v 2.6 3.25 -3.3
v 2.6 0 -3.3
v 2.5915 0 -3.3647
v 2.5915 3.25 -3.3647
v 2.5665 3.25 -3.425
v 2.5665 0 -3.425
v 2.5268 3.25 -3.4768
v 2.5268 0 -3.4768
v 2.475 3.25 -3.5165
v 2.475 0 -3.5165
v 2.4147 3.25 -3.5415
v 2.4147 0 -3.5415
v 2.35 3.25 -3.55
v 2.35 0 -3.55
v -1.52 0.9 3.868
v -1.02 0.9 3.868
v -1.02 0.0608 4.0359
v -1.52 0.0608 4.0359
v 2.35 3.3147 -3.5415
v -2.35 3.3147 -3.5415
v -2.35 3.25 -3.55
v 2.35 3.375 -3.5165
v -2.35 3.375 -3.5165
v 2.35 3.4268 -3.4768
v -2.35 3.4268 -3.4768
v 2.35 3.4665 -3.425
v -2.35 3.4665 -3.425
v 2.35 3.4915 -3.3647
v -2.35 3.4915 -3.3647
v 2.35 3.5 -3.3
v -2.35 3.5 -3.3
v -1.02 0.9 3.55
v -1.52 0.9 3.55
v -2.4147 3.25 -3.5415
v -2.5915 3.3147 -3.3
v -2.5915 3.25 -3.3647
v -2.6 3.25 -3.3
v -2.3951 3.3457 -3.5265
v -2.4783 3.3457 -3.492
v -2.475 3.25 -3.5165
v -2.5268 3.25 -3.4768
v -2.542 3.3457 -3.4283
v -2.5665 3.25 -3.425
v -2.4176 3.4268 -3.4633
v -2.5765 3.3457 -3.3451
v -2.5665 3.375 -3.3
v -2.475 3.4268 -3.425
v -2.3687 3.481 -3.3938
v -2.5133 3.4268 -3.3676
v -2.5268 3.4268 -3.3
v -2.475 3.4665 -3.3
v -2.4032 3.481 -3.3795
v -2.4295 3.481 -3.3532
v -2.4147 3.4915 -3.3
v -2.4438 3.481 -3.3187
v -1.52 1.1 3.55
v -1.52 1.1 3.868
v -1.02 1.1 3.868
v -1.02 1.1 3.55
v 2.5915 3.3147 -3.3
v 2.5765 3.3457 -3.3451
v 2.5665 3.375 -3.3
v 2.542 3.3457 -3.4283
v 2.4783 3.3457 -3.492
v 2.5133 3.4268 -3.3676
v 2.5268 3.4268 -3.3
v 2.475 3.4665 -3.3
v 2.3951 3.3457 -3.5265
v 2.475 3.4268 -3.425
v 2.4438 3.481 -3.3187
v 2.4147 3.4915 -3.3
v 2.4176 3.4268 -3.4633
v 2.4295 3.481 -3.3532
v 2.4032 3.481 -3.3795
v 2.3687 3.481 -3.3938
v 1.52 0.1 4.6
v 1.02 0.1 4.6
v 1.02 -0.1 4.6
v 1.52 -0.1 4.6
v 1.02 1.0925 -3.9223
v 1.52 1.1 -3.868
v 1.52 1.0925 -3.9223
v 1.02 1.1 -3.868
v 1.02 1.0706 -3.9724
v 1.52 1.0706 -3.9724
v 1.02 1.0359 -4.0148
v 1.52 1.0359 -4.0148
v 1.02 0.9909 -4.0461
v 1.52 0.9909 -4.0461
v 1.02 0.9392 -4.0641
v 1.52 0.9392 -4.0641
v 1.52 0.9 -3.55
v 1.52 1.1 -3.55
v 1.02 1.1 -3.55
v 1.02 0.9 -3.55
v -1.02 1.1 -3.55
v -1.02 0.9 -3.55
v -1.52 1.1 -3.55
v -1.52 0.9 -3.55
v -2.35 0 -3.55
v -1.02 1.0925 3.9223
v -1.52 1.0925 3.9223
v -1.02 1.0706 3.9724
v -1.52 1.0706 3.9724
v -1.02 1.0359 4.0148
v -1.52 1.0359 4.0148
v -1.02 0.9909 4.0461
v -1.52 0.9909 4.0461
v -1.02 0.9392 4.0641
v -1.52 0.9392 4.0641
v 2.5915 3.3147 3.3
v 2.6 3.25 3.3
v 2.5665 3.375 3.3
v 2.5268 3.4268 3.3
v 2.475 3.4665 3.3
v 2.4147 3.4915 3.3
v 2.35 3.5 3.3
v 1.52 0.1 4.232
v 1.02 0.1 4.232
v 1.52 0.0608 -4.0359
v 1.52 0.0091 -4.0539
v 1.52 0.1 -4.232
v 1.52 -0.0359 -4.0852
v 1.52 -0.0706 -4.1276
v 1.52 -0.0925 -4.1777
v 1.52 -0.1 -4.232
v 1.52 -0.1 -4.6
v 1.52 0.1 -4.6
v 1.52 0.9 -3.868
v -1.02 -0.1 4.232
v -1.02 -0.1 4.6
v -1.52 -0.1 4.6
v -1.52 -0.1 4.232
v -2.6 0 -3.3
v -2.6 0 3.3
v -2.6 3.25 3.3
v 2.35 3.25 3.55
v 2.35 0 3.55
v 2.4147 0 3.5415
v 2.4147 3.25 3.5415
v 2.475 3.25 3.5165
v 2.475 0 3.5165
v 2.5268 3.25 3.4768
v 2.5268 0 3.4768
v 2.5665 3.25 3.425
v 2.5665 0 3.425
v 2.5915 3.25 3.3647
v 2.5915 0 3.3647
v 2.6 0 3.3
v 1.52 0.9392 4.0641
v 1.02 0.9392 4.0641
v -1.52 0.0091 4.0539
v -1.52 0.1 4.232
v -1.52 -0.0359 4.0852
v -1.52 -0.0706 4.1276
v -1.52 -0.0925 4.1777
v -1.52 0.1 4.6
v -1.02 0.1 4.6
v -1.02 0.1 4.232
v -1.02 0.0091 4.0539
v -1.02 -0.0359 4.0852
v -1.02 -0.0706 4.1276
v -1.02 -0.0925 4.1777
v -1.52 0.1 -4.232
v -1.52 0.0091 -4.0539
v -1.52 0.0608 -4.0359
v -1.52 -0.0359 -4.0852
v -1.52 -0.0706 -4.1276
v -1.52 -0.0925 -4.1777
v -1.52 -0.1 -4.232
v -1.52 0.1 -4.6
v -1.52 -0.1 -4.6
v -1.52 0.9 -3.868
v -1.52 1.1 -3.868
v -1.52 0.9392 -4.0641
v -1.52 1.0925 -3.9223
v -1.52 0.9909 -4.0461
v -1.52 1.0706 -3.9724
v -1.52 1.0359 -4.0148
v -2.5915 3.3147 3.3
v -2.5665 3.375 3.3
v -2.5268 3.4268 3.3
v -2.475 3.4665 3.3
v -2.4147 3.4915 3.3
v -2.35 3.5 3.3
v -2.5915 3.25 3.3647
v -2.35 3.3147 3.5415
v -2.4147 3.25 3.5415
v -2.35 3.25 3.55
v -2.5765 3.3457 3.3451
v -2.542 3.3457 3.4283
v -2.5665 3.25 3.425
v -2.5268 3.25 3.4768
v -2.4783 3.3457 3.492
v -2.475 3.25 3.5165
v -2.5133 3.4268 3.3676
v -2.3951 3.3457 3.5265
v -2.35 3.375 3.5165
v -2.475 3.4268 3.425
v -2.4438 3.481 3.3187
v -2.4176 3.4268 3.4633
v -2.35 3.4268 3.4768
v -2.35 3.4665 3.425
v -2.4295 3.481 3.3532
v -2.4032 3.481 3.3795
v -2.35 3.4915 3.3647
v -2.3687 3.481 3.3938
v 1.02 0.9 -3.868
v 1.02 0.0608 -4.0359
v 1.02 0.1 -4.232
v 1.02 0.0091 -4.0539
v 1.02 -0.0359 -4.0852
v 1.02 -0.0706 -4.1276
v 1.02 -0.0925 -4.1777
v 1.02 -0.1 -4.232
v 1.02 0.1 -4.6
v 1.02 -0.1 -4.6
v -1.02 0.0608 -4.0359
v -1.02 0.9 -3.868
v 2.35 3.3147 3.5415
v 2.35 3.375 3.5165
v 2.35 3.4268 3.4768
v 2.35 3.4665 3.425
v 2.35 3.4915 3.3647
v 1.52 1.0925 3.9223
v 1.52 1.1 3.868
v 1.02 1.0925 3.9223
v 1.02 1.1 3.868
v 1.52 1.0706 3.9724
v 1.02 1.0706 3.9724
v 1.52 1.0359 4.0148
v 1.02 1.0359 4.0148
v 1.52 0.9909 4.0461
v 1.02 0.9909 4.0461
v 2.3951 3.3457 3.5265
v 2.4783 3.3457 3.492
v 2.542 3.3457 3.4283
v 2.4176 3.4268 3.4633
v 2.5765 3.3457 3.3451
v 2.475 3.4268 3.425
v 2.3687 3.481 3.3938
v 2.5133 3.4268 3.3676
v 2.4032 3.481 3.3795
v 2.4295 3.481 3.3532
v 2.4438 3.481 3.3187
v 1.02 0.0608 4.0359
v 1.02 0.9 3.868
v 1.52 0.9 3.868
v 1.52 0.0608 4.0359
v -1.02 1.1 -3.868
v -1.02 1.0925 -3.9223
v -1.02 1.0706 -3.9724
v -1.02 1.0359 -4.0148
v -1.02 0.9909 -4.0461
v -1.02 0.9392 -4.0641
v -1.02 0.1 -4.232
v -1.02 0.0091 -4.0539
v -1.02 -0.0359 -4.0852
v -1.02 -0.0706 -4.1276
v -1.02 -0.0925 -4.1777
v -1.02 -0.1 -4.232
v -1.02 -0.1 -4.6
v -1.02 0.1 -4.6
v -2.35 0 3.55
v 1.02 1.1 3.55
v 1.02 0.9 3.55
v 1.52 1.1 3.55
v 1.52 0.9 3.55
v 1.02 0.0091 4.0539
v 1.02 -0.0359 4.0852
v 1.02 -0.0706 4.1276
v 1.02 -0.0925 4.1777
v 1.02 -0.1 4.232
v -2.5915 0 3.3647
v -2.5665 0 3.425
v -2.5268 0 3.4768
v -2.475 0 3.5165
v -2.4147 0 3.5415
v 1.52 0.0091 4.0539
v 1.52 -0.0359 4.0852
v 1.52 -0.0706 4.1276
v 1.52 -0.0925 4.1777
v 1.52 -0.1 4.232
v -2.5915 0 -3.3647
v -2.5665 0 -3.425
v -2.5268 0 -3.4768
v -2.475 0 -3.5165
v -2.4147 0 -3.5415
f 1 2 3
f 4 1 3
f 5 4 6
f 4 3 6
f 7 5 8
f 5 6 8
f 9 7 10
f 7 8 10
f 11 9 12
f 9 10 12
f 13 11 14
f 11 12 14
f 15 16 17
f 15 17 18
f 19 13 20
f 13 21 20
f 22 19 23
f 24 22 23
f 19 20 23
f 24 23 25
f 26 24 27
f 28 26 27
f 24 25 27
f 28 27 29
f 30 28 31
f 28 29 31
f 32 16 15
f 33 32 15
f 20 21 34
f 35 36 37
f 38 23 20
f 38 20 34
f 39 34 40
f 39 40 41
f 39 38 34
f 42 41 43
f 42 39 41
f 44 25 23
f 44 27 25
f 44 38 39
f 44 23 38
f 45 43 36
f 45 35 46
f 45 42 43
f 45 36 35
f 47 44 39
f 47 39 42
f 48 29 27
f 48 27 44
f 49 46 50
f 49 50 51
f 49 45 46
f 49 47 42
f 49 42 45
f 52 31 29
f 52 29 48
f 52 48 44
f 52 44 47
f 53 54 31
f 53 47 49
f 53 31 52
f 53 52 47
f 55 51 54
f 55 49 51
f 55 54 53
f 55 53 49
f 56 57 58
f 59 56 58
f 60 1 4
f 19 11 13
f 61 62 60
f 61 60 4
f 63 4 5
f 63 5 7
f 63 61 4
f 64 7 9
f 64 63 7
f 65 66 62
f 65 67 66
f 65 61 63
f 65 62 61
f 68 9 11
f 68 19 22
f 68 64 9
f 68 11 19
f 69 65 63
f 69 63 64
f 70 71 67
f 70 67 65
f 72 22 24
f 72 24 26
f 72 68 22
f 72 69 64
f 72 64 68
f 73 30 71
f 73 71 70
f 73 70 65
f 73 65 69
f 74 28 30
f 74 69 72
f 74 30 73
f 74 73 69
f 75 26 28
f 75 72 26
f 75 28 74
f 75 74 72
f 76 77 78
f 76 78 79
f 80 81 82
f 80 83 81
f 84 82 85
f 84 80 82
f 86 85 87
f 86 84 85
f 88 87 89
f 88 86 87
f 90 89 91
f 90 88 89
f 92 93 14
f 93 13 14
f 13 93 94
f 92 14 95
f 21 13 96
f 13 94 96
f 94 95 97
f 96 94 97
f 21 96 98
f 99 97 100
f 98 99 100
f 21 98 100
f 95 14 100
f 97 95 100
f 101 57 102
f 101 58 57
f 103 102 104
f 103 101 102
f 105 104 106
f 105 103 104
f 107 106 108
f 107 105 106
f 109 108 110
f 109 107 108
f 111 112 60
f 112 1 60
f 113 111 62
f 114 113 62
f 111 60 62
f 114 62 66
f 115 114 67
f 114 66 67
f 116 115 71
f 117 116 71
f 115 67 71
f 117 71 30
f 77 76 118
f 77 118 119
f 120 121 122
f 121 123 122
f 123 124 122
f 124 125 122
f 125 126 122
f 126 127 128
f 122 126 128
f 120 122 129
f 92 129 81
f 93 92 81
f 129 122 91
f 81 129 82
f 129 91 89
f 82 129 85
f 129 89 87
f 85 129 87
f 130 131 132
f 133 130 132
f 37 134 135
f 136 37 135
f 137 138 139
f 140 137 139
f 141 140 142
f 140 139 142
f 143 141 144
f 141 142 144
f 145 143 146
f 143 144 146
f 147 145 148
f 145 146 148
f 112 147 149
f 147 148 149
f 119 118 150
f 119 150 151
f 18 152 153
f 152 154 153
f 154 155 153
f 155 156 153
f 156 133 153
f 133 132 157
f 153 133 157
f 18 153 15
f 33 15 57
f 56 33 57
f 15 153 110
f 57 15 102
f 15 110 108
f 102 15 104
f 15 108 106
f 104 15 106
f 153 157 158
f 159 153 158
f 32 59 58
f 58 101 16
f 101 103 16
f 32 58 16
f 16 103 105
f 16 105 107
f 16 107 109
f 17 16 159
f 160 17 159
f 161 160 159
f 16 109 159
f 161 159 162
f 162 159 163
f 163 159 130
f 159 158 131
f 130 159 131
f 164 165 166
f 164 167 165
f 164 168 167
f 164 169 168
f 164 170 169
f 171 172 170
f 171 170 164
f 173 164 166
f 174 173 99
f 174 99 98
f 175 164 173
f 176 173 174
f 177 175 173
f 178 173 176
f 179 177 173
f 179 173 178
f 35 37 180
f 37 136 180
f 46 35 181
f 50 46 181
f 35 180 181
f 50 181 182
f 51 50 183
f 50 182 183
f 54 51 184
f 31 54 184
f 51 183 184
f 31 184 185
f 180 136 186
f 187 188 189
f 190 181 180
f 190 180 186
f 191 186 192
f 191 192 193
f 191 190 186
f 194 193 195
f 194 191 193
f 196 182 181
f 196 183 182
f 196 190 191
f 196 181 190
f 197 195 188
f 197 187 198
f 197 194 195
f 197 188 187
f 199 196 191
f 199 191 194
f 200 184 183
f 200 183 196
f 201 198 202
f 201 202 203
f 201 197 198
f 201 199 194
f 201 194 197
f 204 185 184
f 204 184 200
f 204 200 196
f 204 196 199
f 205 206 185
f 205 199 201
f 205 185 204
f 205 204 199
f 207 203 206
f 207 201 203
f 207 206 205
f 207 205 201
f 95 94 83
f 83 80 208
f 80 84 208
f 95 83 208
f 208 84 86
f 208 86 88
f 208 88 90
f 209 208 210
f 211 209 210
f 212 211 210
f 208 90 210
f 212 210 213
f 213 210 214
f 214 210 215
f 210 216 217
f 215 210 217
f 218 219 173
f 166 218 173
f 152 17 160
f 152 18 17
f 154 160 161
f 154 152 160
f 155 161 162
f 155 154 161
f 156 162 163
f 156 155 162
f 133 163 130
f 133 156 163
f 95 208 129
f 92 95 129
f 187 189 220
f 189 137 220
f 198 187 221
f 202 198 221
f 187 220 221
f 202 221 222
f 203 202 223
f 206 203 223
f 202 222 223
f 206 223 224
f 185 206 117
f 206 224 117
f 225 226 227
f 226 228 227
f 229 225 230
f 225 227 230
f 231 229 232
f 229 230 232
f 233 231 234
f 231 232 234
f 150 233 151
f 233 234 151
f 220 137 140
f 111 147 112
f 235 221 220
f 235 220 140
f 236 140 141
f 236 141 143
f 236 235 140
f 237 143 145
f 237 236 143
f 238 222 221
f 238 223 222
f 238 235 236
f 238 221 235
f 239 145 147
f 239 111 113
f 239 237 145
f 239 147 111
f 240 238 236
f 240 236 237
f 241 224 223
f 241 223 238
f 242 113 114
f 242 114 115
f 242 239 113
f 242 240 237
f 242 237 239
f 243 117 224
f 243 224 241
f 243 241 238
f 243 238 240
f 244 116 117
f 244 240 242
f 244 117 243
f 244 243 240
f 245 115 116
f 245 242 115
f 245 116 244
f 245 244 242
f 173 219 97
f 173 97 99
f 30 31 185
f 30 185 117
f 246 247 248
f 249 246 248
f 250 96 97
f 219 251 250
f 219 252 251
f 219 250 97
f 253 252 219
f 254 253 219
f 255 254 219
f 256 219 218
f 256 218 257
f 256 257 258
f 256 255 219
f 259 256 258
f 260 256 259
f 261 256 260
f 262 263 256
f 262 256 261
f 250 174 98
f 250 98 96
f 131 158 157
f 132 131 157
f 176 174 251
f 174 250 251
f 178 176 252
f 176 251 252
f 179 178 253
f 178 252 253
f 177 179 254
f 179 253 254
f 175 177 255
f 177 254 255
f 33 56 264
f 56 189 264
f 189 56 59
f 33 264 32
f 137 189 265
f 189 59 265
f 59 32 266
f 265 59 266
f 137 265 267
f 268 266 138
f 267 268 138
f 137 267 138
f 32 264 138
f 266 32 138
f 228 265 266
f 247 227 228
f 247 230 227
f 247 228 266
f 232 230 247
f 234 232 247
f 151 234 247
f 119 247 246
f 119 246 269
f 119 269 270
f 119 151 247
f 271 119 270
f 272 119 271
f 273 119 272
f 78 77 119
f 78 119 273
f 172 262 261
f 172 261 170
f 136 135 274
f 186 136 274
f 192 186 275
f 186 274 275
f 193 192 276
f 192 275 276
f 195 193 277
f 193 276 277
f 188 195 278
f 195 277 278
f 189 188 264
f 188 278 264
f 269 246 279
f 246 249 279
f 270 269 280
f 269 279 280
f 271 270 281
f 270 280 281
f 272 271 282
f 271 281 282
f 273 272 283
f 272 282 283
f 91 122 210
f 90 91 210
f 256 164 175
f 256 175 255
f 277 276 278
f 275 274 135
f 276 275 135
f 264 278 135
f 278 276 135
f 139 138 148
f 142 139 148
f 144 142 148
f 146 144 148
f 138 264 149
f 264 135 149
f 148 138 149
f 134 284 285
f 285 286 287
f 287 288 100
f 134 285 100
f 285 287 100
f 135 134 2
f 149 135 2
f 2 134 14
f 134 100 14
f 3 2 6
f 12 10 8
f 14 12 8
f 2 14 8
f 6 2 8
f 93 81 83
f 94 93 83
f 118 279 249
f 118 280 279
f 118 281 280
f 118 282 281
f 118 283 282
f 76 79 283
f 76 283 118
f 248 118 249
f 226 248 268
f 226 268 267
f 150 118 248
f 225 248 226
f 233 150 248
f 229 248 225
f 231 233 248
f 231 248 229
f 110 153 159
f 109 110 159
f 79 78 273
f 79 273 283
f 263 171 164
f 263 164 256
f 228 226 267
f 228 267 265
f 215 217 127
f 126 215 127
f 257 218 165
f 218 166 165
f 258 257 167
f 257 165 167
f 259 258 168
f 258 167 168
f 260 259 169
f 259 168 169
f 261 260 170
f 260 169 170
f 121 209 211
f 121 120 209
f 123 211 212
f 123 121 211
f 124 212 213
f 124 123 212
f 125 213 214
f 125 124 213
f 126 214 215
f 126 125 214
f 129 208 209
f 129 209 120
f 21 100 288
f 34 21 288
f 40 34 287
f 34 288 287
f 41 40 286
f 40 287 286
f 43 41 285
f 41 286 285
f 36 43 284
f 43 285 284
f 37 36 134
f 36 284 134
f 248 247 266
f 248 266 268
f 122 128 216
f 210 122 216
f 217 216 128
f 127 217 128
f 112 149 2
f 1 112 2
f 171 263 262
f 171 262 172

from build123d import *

# Parameters (mm, degrees)
EXTRUDE_1_DEPTH          = 3.5
FILLET_1_R               = 0.25
SKETCH_4_W               = 0.5
SKETCH_4_H               = 0.2
MIRROR_2_COPY_1_SKETCH_W = 0.5
MIRROR_2_COPY_1_SKETCH_H = 0.2


with BuildPart() as part:
    # Эскиз1 → Бобышка-Вытянуть1 (new body)
    with BuildSketch(Plane(origin=(0, 0, 0), x_dir=(1, 0, 0), z_dir=(0, 1, 0))):
        with BuildLine():
            Line((-2.35, -3.55), (2.35, -3.55))
            ThreePointArc((2.35, -3.55), (2.526776695, -3.476776695), (2.6, -3.3))
            Line((2.6, -3.3), (2.6, 3.3))
            ThreePointArc((2.6, 3.3), (2.526776695, 3.476776695), (2.35, 3.55))
            Line((2.35, 3.55), (-2.35, 3.55))
            ThreePointArc((-2.35, 3.55), (-2.526776695, 3.476776695), (-2.6, 3.3))
            Line((-2.6, 3.3), (-2.6, -3.3))
            ThreePointArc((-2.6, -3.3), (-2.526776695, -3.476776695), (-2.35, -3.55))
        make_face()
    extrude(amount=EXTRUDE_1_DEPTH)

    # Скругление1
    fillet_1_edges = [part.edges().sort_by_distance(p)[0] for p in [
        (2.526776695, 3.5, 3.476776695),
        (2.6, 3.5, 0),
        (2.526776695, 3.5, -3.476776695),
        (0, 3.5, -3.55),
        (-2.526776695, 3.5, -3.476776695),
        (-2.6, 3.5, 0),
        (-2.526776695, 3.5, 3.476776695),
        (0, 3.5, 3.55),
    ]]
    fillet(fillet_1_edges, radius=FILLET_1_R)

    # По траектории3: sweep along a path in Эскиз3
    with BuildLine(Plane(origin=(1.27, 0, 0), x_dir=(0, 0, -1), z_dir=(1, 0, 0))) as sweep_3_path:
        Line((-3.55, 1), (-3.86801961, 1))
        ThreePointArc((-3.86801961, 1), (-3.9314185, 0.977334214), (-3.966077677, 0.919611614))
        Line((-3.966077677, 0.919611614), (-4.133922323, 0.080388386))
        ThreePointArc((-4.133922323, 0.080388386), (-4.1685815, 0.022665786), (-4.23198039, 0))
        Line((-4.23198039, 0), (-4.6, 0))
    # Эскиз4 → По траектории3 (sweep)
    with BuildSketch(Plane.XY.offset(3.55)):
        with Locations((1.27, 1)):
            Rectangle(SKETCH_4_W, SKETCH_4_H)
    sweep_3 = sweep(path=sweep_3_path.line)

    # Зеркальное отражение1: По траектории3 across plane
    add(sweep_3.mirror(Plane.XY))

    # Зеркальное отражение2: По траектории3 across plane
    add(sweep_3.mirror(Plane(origin=(0, 0, 0), x_dir=(0, 0, 1), z_dir=(1, 0, 0))))

    # Зеркальное отражение2 copy 1: sweep along a path in Зеркальное отражение2 copy 1 path
    with BuildLine(Plane.ZY.offset(1.27)) as mirror_2_copy_1_path:
        Line((-3.55, 1), (-3.86801961, 1))
        ThreePointArc((-3.86801961, 1), (-3.9314185, 0.977334214), (-3.966077677, 0.919611614))
        Line((-3.966077677, 0.919611614), (-4.133922323, 0.080388386))
        ThreePointArc((-4.133922323, 0.080388386), (-4.1685815, 0.022665786), (-4.23198039, 0))
        Line((-4.23198039, 0), (-4.6, 0))
    # Зеркальное отражение2 copy 1 sketch → Зеркальное отражение2 copy 1 (sweep)
    with BuildSketch(Plane(origin=(0, 0, -3.55), x_dir=(-1, 0, 0), z_dir=(0, 0, -1))):
        with Locations((1.27, 1)):
            Rectangle(MIRROR_2_COPY_1_SKETCH_W, MIRROR_2_COPY_1_SKETCH_H)
    sweep(path=mirror_2_copy_1_path.line)


solid = part.part
